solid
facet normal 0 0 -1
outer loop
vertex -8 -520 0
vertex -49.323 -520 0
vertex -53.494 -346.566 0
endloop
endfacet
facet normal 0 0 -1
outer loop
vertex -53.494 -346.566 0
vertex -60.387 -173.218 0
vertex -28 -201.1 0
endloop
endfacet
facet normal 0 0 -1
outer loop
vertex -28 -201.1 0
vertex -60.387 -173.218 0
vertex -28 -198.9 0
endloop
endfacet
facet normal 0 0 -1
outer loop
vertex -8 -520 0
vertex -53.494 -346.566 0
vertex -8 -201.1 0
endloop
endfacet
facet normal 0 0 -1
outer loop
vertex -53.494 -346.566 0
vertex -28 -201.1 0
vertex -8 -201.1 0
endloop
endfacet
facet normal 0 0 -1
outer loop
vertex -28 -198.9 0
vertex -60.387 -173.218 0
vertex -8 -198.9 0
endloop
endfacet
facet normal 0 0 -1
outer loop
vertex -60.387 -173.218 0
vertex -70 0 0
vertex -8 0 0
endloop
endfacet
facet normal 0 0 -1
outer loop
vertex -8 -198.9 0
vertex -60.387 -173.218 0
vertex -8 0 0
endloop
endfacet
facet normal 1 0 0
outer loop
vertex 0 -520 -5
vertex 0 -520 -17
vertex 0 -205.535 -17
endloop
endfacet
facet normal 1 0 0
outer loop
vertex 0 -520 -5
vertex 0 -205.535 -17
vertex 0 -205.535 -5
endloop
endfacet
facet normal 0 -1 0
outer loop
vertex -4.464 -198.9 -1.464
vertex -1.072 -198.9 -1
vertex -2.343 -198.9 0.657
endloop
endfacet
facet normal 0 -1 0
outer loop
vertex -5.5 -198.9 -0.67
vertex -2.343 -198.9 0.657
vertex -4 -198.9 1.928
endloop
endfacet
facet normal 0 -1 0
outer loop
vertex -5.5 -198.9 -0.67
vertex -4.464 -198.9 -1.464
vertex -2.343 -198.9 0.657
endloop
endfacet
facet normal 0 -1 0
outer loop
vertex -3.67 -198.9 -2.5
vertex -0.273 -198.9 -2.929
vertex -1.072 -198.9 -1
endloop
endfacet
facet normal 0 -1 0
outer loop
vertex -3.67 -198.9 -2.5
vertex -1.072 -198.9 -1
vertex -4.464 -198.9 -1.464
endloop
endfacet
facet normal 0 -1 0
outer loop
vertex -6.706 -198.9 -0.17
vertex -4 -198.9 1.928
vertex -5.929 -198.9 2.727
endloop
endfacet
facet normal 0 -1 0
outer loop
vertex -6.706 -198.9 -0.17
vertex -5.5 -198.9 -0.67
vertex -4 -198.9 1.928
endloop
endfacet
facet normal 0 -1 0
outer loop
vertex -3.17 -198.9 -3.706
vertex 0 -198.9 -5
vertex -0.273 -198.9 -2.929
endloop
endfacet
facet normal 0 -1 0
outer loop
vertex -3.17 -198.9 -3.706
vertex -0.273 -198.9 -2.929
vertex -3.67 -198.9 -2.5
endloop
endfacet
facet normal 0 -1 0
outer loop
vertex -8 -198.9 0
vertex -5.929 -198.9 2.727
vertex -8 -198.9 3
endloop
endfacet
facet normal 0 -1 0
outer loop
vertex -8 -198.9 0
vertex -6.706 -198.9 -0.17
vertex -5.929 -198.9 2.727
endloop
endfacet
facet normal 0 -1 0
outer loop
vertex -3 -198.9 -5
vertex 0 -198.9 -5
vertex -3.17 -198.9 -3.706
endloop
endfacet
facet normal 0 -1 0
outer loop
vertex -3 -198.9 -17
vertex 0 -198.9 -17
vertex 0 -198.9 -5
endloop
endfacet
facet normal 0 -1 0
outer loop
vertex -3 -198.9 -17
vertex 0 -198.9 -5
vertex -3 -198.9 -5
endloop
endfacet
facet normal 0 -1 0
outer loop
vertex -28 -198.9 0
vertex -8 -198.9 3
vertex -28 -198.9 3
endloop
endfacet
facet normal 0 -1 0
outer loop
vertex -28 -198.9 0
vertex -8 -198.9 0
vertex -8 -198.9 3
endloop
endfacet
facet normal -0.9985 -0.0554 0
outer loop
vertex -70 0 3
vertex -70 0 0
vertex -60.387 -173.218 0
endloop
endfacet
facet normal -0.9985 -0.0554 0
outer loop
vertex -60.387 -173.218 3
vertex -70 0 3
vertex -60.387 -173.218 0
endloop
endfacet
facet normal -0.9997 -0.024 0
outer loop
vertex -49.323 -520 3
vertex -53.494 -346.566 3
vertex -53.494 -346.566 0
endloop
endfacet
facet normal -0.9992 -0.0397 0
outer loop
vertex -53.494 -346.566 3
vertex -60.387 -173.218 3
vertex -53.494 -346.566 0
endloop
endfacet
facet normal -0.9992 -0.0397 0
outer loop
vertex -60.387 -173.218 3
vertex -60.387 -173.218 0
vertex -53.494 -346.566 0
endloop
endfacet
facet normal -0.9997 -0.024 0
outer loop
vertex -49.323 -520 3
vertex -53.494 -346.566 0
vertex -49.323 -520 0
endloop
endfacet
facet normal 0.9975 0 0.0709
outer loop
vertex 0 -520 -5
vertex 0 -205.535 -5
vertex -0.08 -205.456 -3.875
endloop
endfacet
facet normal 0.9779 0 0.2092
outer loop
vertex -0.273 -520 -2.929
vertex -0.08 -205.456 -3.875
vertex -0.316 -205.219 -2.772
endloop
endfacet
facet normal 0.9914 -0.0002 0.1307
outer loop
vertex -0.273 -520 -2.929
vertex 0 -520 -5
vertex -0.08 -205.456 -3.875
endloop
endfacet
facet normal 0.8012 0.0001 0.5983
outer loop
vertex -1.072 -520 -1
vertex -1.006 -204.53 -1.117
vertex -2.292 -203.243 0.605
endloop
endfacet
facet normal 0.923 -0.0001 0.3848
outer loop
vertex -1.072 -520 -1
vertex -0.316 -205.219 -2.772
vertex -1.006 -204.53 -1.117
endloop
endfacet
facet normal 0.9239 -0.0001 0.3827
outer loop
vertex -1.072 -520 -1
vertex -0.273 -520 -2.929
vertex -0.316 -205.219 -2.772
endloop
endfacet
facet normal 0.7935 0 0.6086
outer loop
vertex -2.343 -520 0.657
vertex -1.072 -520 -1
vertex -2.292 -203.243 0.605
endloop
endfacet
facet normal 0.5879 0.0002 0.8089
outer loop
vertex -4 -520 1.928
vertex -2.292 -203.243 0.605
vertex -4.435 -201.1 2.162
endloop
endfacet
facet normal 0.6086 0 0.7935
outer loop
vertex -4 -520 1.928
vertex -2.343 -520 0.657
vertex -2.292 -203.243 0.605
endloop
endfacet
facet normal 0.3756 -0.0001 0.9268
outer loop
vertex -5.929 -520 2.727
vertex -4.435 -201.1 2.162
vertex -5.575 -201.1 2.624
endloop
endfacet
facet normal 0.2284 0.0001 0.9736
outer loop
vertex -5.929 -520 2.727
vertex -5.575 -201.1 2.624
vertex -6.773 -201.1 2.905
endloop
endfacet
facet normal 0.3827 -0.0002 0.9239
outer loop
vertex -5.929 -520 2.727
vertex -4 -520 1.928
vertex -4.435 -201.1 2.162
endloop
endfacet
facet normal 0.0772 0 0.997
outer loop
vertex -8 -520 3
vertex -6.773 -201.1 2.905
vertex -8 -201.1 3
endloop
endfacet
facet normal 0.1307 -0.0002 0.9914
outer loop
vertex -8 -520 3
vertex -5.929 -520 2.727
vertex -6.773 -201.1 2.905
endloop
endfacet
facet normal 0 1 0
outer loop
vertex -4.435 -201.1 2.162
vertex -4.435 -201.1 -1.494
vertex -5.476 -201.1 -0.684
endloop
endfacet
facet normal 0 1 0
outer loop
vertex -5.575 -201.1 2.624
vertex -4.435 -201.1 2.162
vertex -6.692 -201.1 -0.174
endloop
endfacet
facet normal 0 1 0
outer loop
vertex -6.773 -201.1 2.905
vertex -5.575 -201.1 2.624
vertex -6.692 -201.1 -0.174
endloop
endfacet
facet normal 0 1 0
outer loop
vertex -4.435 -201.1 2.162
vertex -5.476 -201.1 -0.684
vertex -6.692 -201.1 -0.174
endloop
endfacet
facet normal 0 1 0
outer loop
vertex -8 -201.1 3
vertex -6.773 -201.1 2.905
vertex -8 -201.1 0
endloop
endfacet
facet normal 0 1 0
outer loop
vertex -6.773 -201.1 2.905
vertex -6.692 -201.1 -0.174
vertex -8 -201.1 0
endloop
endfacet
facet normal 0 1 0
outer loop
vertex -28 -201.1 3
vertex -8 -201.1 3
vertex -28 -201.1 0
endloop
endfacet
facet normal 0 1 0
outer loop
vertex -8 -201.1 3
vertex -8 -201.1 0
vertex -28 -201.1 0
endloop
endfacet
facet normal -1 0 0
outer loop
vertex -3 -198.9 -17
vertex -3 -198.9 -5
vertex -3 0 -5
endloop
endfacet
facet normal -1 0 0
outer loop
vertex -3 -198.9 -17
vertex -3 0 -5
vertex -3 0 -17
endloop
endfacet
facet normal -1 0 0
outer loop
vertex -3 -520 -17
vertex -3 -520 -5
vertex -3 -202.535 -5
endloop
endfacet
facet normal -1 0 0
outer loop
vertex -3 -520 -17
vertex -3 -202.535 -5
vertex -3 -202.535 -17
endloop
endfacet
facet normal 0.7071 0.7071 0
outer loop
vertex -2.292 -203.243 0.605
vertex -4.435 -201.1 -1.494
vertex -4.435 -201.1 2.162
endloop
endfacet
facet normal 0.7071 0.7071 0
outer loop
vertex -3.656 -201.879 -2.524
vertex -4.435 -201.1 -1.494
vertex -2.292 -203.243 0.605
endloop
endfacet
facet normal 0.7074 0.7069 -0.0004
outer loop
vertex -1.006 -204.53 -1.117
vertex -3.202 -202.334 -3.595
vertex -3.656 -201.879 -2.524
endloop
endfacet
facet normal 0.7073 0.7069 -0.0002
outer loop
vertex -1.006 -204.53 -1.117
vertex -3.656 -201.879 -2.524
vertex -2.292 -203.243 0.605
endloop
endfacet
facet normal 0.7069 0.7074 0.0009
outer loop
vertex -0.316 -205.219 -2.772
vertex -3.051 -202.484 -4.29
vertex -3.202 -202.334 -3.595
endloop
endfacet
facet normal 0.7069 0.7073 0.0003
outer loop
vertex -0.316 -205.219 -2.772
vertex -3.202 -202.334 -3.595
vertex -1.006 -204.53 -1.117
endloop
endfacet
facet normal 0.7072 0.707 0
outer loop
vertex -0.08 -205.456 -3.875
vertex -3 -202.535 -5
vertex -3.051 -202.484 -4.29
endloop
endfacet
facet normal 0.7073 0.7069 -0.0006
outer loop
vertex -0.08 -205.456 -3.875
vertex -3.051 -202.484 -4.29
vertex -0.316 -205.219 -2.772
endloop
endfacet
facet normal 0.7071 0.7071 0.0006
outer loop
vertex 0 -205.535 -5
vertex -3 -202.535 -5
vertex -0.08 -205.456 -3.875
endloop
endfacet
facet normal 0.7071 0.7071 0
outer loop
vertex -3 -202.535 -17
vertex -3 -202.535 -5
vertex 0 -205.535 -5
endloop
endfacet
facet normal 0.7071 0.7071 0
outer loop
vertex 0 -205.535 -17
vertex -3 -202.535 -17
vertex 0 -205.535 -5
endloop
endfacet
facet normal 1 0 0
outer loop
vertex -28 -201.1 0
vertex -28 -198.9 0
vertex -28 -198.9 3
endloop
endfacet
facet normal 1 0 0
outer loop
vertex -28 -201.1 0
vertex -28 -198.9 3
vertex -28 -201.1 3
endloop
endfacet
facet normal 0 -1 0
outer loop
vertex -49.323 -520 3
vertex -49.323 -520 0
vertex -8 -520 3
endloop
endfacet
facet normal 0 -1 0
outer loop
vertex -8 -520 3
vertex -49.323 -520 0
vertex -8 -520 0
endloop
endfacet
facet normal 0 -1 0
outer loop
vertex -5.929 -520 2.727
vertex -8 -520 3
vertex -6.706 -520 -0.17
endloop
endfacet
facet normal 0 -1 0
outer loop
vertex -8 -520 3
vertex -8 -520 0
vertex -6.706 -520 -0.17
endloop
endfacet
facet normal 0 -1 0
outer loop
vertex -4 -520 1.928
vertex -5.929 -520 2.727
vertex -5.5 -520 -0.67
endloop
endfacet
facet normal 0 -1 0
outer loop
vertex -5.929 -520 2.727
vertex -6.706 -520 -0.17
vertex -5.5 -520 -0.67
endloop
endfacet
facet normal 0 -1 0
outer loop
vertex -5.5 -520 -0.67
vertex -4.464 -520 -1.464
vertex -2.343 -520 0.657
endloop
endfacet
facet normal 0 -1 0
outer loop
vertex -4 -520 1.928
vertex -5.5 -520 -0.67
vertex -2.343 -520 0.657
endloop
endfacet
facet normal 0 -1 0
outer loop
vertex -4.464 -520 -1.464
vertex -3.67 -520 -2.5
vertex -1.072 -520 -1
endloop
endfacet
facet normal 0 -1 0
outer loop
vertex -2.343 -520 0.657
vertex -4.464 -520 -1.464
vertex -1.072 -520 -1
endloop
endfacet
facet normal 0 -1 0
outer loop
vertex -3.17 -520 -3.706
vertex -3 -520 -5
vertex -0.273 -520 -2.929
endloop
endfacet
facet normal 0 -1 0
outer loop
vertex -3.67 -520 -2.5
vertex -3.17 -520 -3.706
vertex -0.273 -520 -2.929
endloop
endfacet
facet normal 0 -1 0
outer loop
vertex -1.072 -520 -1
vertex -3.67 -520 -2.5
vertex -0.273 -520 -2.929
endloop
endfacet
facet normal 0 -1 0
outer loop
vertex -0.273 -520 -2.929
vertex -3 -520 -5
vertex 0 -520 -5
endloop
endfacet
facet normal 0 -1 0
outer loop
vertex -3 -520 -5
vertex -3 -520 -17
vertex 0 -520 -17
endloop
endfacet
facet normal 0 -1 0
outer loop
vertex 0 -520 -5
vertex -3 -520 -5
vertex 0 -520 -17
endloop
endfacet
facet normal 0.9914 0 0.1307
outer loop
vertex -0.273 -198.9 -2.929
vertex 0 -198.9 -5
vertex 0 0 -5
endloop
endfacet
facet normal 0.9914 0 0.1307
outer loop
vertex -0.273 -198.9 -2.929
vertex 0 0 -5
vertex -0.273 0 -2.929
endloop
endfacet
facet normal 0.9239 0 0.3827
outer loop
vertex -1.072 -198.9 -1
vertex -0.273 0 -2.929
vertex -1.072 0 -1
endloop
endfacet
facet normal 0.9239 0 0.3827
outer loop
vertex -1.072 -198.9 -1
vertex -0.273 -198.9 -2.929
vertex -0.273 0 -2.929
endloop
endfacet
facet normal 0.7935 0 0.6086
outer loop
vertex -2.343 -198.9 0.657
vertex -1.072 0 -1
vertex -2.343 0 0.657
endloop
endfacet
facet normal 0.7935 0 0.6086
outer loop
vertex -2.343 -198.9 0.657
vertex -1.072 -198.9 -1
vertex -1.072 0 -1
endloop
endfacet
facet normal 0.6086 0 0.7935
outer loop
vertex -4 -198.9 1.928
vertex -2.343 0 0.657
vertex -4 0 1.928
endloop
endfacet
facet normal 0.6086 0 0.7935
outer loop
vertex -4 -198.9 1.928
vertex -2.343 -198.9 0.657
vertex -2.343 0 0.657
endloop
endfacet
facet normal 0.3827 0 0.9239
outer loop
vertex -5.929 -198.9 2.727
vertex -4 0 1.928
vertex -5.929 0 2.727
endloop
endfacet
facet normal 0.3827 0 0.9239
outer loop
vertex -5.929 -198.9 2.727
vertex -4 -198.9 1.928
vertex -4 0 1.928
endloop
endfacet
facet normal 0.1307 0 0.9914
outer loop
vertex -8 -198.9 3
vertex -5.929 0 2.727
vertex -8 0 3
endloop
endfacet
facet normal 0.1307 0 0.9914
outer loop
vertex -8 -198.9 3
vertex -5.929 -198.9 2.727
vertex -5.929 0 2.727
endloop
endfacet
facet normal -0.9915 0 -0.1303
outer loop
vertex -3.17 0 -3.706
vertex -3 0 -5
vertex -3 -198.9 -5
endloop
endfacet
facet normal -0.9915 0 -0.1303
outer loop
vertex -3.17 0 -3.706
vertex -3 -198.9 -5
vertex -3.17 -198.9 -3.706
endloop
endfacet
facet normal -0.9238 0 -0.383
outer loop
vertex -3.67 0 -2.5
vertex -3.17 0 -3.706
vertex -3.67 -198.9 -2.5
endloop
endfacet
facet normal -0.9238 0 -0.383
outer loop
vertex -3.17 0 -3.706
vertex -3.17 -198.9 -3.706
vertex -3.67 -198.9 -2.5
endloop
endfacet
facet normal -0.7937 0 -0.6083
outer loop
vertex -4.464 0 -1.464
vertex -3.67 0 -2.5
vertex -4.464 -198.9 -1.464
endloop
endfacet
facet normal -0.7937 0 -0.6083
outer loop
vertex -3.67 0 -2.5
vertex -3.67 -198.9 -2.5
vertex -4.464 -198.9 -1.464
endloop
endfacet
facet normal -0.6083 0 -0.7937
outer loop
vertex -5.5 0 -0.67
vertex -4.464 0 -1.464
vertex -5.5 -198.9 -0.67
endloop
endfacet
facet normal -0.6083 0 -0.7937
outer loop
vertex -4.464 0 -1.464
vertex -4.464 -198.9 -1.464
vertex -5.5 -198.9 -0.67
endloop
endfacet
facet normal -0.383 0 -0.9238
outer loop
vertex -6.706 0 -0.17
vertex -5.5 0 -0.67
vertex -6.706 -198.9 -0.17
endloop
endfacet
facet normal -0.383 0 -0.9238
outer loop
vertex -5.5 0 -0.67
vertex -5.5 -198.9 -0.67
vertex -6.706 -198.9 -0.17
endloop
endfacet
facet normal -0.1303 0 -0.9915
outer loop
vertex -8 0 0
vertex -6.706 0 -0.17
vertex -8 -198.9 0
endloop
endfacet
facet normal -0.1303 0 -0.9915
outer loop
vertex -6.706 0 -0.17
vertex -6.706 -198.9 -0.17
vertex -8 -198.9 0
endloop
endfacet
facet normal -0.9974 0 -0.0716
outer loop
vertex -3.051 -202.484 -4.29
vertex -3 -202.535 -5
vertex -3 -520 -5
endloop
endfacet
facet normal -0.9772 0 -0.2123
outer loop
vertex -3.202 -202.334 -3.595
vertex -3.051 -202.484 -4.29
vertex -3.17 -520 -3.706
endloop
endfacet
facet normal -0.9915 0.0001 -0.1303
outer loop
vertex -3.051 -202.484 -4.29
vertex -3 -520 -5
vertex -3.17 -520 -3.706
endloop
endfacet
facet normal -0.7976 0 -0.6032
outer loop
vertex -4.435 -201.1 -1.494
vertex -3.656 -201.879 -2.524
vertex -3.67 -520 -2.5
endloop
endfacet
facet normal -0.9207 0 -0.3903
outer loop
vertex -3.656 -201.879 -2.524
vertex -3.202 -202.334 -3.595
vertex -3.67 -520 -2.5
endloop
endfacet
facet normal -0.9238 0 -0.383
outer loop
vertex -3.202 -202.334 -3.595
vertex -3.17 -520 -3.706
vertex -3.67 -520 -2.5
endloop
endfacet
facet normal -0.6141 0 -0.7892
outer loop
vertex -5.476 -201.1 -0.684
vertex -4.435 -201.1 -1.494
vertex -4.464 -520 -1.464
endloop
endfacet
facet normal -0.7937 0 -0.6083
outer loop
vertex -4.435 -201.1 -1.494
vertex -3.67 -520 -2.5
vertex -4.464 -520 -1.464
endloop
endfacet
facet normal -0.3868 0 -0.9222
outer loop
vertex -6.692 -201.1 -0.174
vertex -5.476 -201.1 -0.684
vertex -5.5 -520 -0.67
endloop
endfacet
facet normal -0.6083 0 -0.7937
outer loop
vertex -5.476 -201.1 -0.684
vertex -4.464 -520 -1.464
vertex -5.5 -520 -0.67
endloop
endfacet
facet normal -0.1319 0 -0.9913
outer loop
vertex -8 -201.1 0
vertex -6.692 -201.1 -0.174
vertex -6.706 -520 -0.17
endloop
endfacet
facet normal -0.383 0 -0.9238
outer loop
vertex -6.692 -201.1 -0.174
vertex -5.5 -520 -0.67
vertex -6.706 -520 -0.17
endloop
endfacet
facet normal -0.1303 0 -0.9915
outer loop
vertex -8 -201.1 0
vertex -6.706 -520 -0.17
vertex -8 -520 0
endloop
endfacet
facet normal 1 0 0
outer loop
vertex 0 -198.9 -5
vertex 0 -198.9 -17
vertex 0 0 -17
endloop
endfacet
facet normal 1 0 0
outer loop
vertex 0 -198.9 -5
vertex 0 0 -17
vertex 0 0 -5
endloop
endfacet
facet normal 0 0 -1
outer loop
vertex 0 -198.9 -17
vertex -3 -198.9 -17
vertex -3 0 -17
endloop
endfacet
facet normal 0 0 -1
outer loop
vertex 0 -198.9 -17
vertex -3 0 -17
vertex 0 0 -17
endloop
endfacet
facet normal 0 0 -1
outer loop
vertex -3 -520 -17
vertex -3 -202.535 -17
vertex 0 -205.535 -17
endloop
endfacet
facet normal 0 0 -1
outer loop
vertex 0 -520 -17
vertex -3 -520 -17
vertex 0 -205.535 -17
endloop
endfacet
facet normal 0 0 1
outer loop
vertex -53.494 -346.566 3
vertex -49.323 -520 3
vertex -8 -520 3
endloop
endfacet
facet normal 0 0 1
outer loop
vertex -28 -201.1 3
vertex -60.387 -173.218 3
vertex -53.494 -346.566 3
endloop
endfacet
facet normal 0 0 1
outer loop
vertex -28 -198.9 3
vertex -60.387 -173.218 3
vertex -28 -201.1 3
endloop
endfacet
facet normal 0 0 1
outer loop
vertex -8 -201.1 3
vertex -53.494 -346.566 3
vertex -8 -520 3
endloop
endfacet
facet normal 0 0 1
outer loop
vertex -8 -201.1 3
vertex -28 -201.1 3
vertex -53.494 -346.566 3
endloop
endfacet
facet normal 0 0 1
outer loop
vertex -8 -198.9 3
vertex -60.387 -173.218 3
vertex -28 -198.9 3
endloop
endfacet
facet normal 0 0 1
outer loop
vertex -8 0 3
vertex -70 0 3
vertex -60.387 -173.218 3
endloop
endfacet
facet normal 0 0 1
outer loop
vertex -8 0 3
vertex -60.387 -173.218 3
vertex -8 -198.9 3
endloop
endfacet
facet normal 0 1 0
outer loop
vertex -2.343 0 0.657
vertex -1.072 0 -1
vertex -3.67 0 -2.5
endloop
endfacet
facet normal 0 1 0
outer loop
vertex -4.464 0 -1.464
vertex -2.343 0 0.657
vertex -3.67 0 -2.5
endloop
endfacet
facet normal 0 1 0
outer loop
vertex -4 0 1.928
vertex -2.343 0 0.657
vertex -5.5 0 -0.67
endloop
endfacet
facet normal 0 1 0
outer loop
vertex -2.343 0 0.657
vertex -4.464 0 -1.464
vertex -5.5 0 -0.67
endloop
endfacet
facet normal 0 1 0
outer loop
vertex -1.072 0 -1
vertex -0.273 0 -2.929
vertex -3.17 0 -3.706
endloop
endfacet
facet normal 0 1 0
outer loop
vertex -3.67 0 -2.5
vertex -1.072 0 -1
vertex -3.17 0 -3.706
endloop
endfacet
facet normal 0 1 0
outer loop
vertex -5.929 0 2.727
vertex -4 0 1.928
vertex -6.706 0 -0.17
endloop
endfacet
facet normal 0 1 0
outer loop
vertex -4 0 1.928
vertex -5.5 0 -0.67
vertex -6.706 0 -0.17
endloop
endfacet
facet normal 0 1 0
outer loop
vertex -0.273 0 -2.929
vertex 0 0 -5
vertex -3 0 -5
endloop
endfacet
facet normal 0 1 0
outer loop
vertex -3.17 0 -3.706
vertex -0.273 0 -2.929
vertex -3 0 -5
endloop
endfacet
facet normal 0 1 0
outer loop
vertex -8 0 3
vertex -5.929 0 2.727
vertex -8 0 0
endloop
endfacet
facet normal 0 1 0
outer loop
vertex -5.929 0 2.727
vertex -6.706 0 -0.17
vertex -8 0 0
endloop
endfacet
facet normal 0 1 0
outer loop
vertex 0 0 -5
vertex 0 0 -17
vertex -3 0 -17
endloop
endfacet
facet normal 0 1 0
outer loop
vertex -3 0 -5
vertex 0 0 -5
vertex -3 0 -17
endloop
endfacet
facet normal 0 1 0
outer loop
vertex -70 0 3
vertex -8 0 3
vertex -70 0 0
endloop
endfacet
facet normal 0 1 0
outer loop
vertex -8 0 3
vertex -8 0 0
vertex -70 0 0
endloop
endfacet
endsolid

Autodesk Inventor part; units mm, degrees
ref_plane "YZ Plane" through (0, 0, 0) normal (1, 0, 0) x (0, 1, 0)
ref_plane "XZ Plane" through (0, 0, 0) normal (0, 1, 0) x (-1, 0, 0)
ref_plane "XY Plane" through (0, 0, 0) normal (0, 0, 1) x (1, 0, 0)
sketch "Sketch1" plane through (0, 0, 0) normal (0, 0, 1) x (1, 0, 0)
  arc A0 (-97, -1740) -> (-70, 0) centre (-11100.8726, -699.0408) ccw
  line L0 (0, 0) -> (-70, 0)
  line L1 (0, -16.732) -> (-68.9524, -16.732) construction
  line L2 (0, -496.732) -> (-49.7243, -496.732) construction
  line L3 (0, -976.732) -> (-51.3615, -976.732) construction
  line L4 (0, -1456.732) -> (-73.8734, -1456.732) construction
  line L5 (-97, -1740) -> (0, -1740)
  line L6 (0, 0) -> (0, -1740)
  line L7 (0, -1730) -> (-10.3553, -1740)
  point P0 (-20, 0)
  dimension "d33" = 50
  dimension "d58" = 480
  dimension "d59" = 480
  dimension "d60" = 480
  dimension "d141" = 1740
  dimension "d148" = 70
  dimension "d149" = 11053
  dimension "d150" = 97
  dimension "d151" = 136
  dimension "d153" = 10
extrude "Plate3" add sketch "Sketch1" along normal blind 3 contours A0 L0 L6 L7 L5
sketch "Sketch3" plane through (-3, 0, 3) normal (1, 0, 0) x (0, 1, 0)
  line L0 (-1730, 0) -> (0, 0)
  line L1 (0, 0) -> (0, 20)
  line L2 (0, 20) -> (-1730, 20)
  line L3 (-1730, 20) -> (-1730, 0)
edge flange "Flange2" height 20 angle 90 thickness 3 bend radius 5 thickness toward (1, 0, 0) relief round relief width 3 relief depth 1.5 edges at (0, -865, 3) wall of the first edge with corners at (-3, -1730, 3) (-3, 0, 3) (-3, 0, -17) (-3, -1730, -17)
bend "Bend2"
corner "Corner2"
sketch "Sketch5" plane through (0, 0, 0) normal (0, 0, 1) x (1, 0, 0)
  line L0 (-8, -1737.7255) -> (-8, 0) projected
  line L1 (-70, 0) -> (-8, 0) projected
  arc A0 (-97, -1740) -> (-70, 0) centre (-11100.8726, -699.0408) ccw projected
  line L2 (0, 0) -> (0, -1730) projected
  line L3 (0, -198.9) -> (-28, -198.9)
  line L4 (0, -201.1) -> (-3, -201.1)
  line L5 (-3, -1730) -> (-3, 0) projected
  line L6 (-28, -198.9) -> (-28, -201.1)
  line L7 (0, -608.9) -> (-48.2402, -608.9) construction
  line L8 (0, -1018.9) -> (-52.5018, -1018.9) construction
  line L9 (0, -1428.9) -> (-71.9962, -1428.9) construction
  line L10 (-10.3553, -1740) -> (-97, -1740) projected
  line L11 (0, -198.9) -> (0, -218.9)
  line L12 (-3, -198.9) -> (-3, -201.1) construction
  line L13 (0, -218.9) -> (-3, -218.9)
  line L14 (-28, -198.9) -> (-59.1939, -198.9) construction
  line L15 (-28, -201.1) -> (-59.0945, -201.1) construction
  line L16 (-3, -201.1) -> (-3, -218.9)
  line L17 (-3, -201.1) -> (-28, -201.1)
  line L18 (-3, -218.9) -> (-8, -218.9)
  line L19 (-8, -1737.7255) -> (-10.3553, -1740) projected
  line L20 (-4.4351, -201.1) -> (0, -205.5351)
  line L21 (-4.4351, -201.1) -> (1.8371, -201.1) construction
  line L22 (-10.3553, -1740) -> (-10.3553, -1770)
  point P0 (0, 0)
  point P1 (845.25, -380.4205)
  point P2 (848, -380.4205)
  point P3 (-28, -200)
  point P4 (850, -410.4205)
  point P5 (-3, -198.9)
  point P6 (-3, -218.9)
  point P7 (-8, -201.1)
  point P8 (0, -205.5351)
  dimension "d69" = 1730
  dimension "d70" = 2.2
  dimension "d76" = 59.1939
  dimension "d80" = 48.2402
  dimension "d102" = 71.9962
  dimension "d104" = 52.5018
  dimension "d106" = 3
  dimension "d107" = 20
  dimension "d108" = 200
  dimension "d112" = 28
  dimension "d142" = 410
  dimension "d143" = 410
  dimension "d144" = 410
  dimension "d154" = 45
  dimension "d155" = 30
  dimension "d156" = 341.1
extrude "Extrusion2" cut sketch "Sketch5" along normal through all both and the other way through all contours L17 L6 L3 L0 | L0 L3 L5 L17 | L17 L5 L20 | L5 L4 L2 L20 | L3 L2 L4 L5
pattern_linear "Rectangular Pattern3" count 4 spacing 410 along (0, -1, 0) of "Extrusion2"
sketch "Sketch7" plane through (0, 0, 0) normal (0, 0, 1) x (1, 0, 0)
  line L0 (0, 0) -> (0, -198.9) projected
  line L1 (0, 0) -> (-100, 0)
  line L2 (-100, 0) -> (-100, -520)
  line L3 (-100, -520) -> (0, -520)
  line L4 (0, -520) -> (0, 0)
  line L5 (-100, -1740) -> (0, -1740)
  line L6 (0, -1740) -> (0, -520)
  line L7 (0, -520) -> (-100, -520)
  line L8 (-100, -520) -> (-100, -1740)
  line L9 (-97, -1740) -> (-10.3553, -1740) projected
  point P0 (-50, -1740)
  dimension "d157" = 100
  dimension "d158" = 520
extrude "Extrusion3" cut sketch "Sketch7" along normal through all both and the other way through all contours L6 L5 L8 L3
equation "\"d33\" = d25"
equation "\"БОРТ_стрингер_3_высота\" = 59"
equation "\"БОРТ_стрингер_4_высота\" = 48"
equation "\"БОРТ_стрингер_5_высота\" = 53"
equation "\"БОРТ_стрингер_6_высота\" = 72"
equation "\"d25\" = 50"
properties part number "MSC 348 RIB BOARD" material "Stainless Steel"
